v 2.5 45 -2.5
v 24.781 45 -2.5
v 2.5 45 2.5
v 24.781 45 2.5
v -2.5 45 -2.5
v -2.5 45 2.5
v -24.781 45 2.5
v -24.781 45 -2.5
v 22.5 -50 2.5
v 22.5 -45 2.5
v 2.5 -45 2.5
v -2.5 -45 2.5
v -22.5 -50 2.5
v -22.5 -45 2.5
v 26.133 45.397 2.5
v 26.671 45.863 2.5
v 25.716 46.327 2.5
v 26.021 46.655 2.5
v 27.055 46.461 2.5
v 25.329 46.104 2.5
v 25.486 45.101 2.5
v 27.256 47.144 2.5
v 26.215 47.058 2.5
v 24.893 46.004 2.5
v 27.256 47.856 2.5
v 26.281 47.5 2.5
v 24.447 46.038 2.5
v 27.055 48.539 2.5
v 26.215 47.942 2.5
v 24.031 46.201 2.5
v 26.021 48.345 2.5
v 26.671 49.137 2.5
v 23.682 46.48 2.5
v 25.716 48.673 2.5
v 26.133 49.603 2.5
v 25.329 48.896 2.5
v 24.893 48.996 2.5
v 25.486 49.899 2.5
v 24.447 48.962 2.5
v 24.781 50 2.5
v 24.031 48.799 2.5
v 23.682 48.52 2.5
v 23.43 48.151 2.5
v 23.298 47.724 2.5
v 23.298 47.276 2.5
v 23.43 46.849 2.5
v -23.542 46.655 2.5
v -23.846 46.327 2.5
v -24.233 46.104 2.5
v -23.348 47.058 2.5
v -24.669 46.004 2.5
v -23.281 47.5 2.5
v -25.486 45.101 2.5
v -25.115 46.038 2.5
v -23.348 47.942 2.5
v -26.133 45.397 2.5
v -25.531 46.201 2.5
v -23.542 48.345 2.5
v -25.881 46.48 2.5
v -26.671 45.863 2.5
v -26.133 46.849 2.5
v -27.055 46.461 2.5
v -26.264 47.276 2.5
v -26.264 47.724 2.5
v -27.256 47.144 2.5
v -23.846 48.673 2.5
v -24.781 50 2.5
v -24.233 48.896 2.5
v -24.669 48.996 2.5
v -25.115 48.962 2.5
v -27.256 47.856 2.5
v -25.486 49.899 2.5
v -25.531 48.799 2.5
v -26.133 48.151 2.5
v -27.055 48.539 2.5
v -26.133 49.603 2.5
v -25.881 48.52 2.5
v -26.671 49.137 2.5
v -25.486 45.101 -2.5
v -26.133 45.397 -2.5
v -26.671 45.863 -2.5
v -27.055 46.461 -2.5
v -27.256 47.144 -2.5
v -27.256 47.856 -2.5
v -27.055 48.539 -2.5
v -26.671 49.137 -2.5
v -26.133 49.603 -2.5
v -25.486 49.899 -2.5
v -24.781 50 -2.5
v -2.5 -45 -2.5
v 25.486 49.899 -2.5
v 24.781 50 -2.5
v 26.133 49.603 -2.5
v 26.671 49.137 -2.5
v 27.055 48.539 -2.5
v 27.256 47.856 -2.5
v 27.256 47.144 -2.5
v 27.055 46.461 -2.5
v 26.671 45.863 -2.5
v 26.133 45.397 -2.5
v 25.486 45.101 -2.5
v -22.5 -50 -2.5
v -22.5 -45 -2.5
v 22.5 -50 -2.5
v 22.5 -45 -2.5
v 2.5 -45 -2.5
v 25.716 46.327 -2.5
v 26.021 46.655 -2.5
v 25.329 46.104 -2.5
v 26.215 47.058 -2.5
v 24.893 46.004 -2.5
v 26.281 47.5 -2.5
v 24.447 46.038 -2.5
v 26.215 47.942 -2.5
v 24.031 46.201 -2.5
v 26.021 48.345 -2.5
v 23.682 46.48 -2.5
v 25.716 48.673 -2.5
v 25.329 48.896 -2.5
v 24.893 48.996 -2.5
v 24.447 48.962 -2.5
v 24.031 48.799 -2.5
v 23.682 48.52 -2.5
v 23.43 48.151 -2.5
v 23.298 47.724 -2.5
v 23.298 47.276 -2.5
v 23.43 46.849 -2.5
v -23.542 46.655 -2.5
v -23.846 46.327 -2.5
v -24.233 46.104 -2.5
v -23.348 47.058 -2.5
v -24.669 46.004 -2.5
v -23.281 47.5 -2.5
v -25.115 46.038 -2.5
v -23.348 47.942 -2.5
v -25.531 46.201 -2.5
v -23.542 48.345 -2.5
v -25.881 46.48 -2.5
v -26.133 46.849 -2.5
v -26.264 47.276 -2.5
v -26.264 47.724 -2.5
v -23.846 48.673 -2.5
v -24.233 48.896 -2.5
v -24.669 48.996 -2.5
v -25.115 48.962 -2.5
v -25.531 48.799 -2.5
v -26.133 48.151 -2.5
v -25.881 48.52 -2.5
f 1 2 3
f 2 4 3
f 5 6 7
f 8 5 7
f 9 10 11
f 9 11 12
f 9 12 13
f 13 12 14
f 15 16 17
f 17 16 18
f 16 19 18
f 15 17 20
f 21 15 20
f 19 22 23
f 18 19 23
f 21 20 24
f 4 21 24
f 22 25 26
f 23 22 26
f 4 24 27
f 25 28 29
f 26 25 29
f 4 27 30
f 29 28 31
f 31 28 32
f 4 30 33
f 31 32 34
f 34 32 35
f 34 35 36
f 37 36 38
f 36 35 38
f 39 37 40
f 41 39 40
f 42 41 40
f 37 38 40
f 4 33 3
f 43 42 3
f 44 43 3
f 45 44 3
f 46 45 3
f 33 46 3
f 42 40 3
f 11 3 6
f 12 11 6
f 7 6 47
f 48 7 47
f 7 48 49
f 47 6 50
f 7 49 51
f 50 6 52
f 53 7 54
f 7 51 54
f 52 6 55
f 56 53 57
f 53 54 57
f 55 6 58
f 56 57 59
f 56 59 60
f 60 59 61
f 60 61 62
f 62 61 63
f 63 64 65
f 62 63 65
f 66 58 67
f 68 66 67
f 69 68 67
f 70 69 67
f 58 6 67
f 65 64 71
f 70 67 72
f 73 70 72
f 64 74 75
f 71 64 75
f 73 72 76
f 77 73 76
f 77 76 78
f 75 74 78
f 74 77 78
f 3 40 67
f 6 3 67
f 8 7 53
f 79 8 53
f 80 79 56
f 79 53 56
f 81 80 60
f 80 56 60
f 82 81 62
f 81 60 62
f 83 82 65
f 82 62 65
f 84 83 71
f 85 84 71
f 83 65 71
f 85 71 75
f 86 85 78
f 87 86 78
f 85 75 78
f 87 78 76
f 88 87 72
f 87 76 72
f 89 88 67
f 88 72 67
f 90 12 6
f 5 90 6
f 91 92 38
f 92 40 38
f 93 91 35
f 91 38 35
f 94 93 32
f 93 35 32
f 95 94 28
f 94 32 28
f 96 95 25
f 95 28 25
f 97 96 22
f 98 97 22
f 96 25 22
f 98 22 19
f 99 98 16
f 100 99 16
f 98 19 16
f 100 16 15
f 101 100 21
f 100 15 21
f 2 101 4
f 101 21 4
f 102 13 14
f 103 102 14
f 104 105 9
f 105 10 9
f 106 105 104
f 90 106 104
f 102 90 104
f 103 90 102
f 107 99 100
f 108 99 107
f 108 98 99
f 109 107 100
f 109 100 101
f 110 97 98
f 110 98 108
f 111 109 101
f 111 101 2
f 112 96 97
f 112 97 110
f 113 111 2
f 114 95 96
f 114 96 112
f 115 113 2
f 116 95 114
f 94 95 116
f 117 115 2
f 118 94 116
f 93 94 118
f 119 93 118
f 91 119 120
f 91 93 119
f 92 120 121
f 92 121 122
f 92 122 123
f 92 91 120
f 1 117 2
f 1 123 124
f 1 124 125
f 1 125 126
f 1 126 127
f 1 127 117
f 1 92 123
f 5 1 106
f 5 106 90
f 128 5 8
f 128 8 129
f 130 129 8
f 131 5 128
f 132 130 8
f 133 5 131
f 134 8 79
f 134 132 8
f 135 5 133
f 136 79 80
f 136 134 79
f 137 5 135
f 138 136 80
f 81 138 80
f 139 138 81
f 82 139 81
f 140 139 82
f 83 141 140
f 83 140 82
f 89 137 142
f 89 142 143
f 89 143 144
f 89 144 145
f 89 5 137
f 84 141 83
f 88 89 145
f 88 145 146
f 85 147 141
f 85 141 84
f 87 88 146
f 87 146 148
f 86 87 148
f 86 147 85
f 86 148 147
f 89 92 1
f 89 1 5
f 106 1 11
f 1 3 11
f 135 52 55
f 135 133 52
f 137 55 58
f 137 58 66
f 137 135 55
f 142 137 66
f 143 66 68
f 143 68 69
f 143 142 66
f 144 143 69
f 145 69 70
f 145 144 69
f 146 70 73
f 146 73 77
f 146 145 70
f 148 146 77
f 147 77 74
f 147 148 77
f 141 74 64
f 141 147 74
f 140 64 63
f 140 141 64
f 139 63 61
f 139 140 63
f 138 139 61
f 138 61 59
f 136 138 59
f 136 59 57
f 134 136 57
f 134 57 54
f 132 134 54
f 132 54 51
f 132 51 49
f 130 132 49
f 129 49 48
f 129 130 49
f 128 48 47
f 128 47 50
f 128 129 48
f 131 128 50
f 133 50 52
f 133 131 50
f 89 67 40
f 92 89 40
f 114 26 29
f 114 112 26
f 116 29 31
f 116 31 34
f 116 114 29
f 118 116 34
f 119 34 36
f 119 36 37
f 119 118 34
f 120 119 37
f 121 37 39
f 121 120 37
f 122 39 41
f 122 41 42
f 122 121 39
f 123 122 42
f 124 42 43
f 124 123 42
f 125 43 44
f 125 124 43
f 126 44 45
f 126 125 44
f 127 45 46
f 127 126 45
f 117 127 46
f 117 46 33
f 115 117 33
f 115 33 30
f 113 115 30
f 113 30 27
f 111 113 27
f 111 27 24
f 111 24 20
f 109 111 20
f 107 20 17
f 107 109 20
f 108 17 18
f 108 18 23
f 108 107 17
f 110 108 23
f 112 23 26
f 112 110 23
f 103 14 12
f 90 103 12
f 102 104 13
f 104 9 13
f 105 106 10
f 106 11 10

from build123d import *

# Parameters (mm, degrees)
SKETCH1_R           = 1.5
BOSS_EXTRUDE1_DEPTH = 2.5


with BuildPart() as part:
    # Sketch1 → Boss-Extrude1 (new, symmetric)
    with BuildSketch(Plane.XY):
        with BuildLine():
            Line((-24.78125, 50), (24.78125, 50))
            ThreePointArc((24.78125, 50), (27.28125, 47.5), (24.78125, 45))
            Line((24.78125, 45), (2.5, 45))
            Line((2.5, 45), (2.5, -45))
            Line((2.5, -45), (22.5, -45))
            Line((22.5, -45), (22.5, -50))
            Line((22.5, -50), (-22.5, -50))
            Line((-22.5, -50), (-22.5, -45))
            Line((-22.5, -45), (-2.5, -45))
            Line((-2.5, -45), (-2.5, 45))
            Line((-2.5, 45), (-24.78125, 45))
            ThreePointArc((-24.78125, 45), (-27.28125, 47.5), (-24.78125, 50))
        make_face()
        with Locations((-24.78125, 47.5)):
            Circle(SKETCH1_R, mode=Mode.SUBTRACT)
        with Locations((24.78125, 47.5)):
            Circle(SKETCH1_R, mode=Mode.SUBTRACT)
    extrude(amount=BOSS_EXTRUDE1_DEPTH, both=True)


solid = part.part
